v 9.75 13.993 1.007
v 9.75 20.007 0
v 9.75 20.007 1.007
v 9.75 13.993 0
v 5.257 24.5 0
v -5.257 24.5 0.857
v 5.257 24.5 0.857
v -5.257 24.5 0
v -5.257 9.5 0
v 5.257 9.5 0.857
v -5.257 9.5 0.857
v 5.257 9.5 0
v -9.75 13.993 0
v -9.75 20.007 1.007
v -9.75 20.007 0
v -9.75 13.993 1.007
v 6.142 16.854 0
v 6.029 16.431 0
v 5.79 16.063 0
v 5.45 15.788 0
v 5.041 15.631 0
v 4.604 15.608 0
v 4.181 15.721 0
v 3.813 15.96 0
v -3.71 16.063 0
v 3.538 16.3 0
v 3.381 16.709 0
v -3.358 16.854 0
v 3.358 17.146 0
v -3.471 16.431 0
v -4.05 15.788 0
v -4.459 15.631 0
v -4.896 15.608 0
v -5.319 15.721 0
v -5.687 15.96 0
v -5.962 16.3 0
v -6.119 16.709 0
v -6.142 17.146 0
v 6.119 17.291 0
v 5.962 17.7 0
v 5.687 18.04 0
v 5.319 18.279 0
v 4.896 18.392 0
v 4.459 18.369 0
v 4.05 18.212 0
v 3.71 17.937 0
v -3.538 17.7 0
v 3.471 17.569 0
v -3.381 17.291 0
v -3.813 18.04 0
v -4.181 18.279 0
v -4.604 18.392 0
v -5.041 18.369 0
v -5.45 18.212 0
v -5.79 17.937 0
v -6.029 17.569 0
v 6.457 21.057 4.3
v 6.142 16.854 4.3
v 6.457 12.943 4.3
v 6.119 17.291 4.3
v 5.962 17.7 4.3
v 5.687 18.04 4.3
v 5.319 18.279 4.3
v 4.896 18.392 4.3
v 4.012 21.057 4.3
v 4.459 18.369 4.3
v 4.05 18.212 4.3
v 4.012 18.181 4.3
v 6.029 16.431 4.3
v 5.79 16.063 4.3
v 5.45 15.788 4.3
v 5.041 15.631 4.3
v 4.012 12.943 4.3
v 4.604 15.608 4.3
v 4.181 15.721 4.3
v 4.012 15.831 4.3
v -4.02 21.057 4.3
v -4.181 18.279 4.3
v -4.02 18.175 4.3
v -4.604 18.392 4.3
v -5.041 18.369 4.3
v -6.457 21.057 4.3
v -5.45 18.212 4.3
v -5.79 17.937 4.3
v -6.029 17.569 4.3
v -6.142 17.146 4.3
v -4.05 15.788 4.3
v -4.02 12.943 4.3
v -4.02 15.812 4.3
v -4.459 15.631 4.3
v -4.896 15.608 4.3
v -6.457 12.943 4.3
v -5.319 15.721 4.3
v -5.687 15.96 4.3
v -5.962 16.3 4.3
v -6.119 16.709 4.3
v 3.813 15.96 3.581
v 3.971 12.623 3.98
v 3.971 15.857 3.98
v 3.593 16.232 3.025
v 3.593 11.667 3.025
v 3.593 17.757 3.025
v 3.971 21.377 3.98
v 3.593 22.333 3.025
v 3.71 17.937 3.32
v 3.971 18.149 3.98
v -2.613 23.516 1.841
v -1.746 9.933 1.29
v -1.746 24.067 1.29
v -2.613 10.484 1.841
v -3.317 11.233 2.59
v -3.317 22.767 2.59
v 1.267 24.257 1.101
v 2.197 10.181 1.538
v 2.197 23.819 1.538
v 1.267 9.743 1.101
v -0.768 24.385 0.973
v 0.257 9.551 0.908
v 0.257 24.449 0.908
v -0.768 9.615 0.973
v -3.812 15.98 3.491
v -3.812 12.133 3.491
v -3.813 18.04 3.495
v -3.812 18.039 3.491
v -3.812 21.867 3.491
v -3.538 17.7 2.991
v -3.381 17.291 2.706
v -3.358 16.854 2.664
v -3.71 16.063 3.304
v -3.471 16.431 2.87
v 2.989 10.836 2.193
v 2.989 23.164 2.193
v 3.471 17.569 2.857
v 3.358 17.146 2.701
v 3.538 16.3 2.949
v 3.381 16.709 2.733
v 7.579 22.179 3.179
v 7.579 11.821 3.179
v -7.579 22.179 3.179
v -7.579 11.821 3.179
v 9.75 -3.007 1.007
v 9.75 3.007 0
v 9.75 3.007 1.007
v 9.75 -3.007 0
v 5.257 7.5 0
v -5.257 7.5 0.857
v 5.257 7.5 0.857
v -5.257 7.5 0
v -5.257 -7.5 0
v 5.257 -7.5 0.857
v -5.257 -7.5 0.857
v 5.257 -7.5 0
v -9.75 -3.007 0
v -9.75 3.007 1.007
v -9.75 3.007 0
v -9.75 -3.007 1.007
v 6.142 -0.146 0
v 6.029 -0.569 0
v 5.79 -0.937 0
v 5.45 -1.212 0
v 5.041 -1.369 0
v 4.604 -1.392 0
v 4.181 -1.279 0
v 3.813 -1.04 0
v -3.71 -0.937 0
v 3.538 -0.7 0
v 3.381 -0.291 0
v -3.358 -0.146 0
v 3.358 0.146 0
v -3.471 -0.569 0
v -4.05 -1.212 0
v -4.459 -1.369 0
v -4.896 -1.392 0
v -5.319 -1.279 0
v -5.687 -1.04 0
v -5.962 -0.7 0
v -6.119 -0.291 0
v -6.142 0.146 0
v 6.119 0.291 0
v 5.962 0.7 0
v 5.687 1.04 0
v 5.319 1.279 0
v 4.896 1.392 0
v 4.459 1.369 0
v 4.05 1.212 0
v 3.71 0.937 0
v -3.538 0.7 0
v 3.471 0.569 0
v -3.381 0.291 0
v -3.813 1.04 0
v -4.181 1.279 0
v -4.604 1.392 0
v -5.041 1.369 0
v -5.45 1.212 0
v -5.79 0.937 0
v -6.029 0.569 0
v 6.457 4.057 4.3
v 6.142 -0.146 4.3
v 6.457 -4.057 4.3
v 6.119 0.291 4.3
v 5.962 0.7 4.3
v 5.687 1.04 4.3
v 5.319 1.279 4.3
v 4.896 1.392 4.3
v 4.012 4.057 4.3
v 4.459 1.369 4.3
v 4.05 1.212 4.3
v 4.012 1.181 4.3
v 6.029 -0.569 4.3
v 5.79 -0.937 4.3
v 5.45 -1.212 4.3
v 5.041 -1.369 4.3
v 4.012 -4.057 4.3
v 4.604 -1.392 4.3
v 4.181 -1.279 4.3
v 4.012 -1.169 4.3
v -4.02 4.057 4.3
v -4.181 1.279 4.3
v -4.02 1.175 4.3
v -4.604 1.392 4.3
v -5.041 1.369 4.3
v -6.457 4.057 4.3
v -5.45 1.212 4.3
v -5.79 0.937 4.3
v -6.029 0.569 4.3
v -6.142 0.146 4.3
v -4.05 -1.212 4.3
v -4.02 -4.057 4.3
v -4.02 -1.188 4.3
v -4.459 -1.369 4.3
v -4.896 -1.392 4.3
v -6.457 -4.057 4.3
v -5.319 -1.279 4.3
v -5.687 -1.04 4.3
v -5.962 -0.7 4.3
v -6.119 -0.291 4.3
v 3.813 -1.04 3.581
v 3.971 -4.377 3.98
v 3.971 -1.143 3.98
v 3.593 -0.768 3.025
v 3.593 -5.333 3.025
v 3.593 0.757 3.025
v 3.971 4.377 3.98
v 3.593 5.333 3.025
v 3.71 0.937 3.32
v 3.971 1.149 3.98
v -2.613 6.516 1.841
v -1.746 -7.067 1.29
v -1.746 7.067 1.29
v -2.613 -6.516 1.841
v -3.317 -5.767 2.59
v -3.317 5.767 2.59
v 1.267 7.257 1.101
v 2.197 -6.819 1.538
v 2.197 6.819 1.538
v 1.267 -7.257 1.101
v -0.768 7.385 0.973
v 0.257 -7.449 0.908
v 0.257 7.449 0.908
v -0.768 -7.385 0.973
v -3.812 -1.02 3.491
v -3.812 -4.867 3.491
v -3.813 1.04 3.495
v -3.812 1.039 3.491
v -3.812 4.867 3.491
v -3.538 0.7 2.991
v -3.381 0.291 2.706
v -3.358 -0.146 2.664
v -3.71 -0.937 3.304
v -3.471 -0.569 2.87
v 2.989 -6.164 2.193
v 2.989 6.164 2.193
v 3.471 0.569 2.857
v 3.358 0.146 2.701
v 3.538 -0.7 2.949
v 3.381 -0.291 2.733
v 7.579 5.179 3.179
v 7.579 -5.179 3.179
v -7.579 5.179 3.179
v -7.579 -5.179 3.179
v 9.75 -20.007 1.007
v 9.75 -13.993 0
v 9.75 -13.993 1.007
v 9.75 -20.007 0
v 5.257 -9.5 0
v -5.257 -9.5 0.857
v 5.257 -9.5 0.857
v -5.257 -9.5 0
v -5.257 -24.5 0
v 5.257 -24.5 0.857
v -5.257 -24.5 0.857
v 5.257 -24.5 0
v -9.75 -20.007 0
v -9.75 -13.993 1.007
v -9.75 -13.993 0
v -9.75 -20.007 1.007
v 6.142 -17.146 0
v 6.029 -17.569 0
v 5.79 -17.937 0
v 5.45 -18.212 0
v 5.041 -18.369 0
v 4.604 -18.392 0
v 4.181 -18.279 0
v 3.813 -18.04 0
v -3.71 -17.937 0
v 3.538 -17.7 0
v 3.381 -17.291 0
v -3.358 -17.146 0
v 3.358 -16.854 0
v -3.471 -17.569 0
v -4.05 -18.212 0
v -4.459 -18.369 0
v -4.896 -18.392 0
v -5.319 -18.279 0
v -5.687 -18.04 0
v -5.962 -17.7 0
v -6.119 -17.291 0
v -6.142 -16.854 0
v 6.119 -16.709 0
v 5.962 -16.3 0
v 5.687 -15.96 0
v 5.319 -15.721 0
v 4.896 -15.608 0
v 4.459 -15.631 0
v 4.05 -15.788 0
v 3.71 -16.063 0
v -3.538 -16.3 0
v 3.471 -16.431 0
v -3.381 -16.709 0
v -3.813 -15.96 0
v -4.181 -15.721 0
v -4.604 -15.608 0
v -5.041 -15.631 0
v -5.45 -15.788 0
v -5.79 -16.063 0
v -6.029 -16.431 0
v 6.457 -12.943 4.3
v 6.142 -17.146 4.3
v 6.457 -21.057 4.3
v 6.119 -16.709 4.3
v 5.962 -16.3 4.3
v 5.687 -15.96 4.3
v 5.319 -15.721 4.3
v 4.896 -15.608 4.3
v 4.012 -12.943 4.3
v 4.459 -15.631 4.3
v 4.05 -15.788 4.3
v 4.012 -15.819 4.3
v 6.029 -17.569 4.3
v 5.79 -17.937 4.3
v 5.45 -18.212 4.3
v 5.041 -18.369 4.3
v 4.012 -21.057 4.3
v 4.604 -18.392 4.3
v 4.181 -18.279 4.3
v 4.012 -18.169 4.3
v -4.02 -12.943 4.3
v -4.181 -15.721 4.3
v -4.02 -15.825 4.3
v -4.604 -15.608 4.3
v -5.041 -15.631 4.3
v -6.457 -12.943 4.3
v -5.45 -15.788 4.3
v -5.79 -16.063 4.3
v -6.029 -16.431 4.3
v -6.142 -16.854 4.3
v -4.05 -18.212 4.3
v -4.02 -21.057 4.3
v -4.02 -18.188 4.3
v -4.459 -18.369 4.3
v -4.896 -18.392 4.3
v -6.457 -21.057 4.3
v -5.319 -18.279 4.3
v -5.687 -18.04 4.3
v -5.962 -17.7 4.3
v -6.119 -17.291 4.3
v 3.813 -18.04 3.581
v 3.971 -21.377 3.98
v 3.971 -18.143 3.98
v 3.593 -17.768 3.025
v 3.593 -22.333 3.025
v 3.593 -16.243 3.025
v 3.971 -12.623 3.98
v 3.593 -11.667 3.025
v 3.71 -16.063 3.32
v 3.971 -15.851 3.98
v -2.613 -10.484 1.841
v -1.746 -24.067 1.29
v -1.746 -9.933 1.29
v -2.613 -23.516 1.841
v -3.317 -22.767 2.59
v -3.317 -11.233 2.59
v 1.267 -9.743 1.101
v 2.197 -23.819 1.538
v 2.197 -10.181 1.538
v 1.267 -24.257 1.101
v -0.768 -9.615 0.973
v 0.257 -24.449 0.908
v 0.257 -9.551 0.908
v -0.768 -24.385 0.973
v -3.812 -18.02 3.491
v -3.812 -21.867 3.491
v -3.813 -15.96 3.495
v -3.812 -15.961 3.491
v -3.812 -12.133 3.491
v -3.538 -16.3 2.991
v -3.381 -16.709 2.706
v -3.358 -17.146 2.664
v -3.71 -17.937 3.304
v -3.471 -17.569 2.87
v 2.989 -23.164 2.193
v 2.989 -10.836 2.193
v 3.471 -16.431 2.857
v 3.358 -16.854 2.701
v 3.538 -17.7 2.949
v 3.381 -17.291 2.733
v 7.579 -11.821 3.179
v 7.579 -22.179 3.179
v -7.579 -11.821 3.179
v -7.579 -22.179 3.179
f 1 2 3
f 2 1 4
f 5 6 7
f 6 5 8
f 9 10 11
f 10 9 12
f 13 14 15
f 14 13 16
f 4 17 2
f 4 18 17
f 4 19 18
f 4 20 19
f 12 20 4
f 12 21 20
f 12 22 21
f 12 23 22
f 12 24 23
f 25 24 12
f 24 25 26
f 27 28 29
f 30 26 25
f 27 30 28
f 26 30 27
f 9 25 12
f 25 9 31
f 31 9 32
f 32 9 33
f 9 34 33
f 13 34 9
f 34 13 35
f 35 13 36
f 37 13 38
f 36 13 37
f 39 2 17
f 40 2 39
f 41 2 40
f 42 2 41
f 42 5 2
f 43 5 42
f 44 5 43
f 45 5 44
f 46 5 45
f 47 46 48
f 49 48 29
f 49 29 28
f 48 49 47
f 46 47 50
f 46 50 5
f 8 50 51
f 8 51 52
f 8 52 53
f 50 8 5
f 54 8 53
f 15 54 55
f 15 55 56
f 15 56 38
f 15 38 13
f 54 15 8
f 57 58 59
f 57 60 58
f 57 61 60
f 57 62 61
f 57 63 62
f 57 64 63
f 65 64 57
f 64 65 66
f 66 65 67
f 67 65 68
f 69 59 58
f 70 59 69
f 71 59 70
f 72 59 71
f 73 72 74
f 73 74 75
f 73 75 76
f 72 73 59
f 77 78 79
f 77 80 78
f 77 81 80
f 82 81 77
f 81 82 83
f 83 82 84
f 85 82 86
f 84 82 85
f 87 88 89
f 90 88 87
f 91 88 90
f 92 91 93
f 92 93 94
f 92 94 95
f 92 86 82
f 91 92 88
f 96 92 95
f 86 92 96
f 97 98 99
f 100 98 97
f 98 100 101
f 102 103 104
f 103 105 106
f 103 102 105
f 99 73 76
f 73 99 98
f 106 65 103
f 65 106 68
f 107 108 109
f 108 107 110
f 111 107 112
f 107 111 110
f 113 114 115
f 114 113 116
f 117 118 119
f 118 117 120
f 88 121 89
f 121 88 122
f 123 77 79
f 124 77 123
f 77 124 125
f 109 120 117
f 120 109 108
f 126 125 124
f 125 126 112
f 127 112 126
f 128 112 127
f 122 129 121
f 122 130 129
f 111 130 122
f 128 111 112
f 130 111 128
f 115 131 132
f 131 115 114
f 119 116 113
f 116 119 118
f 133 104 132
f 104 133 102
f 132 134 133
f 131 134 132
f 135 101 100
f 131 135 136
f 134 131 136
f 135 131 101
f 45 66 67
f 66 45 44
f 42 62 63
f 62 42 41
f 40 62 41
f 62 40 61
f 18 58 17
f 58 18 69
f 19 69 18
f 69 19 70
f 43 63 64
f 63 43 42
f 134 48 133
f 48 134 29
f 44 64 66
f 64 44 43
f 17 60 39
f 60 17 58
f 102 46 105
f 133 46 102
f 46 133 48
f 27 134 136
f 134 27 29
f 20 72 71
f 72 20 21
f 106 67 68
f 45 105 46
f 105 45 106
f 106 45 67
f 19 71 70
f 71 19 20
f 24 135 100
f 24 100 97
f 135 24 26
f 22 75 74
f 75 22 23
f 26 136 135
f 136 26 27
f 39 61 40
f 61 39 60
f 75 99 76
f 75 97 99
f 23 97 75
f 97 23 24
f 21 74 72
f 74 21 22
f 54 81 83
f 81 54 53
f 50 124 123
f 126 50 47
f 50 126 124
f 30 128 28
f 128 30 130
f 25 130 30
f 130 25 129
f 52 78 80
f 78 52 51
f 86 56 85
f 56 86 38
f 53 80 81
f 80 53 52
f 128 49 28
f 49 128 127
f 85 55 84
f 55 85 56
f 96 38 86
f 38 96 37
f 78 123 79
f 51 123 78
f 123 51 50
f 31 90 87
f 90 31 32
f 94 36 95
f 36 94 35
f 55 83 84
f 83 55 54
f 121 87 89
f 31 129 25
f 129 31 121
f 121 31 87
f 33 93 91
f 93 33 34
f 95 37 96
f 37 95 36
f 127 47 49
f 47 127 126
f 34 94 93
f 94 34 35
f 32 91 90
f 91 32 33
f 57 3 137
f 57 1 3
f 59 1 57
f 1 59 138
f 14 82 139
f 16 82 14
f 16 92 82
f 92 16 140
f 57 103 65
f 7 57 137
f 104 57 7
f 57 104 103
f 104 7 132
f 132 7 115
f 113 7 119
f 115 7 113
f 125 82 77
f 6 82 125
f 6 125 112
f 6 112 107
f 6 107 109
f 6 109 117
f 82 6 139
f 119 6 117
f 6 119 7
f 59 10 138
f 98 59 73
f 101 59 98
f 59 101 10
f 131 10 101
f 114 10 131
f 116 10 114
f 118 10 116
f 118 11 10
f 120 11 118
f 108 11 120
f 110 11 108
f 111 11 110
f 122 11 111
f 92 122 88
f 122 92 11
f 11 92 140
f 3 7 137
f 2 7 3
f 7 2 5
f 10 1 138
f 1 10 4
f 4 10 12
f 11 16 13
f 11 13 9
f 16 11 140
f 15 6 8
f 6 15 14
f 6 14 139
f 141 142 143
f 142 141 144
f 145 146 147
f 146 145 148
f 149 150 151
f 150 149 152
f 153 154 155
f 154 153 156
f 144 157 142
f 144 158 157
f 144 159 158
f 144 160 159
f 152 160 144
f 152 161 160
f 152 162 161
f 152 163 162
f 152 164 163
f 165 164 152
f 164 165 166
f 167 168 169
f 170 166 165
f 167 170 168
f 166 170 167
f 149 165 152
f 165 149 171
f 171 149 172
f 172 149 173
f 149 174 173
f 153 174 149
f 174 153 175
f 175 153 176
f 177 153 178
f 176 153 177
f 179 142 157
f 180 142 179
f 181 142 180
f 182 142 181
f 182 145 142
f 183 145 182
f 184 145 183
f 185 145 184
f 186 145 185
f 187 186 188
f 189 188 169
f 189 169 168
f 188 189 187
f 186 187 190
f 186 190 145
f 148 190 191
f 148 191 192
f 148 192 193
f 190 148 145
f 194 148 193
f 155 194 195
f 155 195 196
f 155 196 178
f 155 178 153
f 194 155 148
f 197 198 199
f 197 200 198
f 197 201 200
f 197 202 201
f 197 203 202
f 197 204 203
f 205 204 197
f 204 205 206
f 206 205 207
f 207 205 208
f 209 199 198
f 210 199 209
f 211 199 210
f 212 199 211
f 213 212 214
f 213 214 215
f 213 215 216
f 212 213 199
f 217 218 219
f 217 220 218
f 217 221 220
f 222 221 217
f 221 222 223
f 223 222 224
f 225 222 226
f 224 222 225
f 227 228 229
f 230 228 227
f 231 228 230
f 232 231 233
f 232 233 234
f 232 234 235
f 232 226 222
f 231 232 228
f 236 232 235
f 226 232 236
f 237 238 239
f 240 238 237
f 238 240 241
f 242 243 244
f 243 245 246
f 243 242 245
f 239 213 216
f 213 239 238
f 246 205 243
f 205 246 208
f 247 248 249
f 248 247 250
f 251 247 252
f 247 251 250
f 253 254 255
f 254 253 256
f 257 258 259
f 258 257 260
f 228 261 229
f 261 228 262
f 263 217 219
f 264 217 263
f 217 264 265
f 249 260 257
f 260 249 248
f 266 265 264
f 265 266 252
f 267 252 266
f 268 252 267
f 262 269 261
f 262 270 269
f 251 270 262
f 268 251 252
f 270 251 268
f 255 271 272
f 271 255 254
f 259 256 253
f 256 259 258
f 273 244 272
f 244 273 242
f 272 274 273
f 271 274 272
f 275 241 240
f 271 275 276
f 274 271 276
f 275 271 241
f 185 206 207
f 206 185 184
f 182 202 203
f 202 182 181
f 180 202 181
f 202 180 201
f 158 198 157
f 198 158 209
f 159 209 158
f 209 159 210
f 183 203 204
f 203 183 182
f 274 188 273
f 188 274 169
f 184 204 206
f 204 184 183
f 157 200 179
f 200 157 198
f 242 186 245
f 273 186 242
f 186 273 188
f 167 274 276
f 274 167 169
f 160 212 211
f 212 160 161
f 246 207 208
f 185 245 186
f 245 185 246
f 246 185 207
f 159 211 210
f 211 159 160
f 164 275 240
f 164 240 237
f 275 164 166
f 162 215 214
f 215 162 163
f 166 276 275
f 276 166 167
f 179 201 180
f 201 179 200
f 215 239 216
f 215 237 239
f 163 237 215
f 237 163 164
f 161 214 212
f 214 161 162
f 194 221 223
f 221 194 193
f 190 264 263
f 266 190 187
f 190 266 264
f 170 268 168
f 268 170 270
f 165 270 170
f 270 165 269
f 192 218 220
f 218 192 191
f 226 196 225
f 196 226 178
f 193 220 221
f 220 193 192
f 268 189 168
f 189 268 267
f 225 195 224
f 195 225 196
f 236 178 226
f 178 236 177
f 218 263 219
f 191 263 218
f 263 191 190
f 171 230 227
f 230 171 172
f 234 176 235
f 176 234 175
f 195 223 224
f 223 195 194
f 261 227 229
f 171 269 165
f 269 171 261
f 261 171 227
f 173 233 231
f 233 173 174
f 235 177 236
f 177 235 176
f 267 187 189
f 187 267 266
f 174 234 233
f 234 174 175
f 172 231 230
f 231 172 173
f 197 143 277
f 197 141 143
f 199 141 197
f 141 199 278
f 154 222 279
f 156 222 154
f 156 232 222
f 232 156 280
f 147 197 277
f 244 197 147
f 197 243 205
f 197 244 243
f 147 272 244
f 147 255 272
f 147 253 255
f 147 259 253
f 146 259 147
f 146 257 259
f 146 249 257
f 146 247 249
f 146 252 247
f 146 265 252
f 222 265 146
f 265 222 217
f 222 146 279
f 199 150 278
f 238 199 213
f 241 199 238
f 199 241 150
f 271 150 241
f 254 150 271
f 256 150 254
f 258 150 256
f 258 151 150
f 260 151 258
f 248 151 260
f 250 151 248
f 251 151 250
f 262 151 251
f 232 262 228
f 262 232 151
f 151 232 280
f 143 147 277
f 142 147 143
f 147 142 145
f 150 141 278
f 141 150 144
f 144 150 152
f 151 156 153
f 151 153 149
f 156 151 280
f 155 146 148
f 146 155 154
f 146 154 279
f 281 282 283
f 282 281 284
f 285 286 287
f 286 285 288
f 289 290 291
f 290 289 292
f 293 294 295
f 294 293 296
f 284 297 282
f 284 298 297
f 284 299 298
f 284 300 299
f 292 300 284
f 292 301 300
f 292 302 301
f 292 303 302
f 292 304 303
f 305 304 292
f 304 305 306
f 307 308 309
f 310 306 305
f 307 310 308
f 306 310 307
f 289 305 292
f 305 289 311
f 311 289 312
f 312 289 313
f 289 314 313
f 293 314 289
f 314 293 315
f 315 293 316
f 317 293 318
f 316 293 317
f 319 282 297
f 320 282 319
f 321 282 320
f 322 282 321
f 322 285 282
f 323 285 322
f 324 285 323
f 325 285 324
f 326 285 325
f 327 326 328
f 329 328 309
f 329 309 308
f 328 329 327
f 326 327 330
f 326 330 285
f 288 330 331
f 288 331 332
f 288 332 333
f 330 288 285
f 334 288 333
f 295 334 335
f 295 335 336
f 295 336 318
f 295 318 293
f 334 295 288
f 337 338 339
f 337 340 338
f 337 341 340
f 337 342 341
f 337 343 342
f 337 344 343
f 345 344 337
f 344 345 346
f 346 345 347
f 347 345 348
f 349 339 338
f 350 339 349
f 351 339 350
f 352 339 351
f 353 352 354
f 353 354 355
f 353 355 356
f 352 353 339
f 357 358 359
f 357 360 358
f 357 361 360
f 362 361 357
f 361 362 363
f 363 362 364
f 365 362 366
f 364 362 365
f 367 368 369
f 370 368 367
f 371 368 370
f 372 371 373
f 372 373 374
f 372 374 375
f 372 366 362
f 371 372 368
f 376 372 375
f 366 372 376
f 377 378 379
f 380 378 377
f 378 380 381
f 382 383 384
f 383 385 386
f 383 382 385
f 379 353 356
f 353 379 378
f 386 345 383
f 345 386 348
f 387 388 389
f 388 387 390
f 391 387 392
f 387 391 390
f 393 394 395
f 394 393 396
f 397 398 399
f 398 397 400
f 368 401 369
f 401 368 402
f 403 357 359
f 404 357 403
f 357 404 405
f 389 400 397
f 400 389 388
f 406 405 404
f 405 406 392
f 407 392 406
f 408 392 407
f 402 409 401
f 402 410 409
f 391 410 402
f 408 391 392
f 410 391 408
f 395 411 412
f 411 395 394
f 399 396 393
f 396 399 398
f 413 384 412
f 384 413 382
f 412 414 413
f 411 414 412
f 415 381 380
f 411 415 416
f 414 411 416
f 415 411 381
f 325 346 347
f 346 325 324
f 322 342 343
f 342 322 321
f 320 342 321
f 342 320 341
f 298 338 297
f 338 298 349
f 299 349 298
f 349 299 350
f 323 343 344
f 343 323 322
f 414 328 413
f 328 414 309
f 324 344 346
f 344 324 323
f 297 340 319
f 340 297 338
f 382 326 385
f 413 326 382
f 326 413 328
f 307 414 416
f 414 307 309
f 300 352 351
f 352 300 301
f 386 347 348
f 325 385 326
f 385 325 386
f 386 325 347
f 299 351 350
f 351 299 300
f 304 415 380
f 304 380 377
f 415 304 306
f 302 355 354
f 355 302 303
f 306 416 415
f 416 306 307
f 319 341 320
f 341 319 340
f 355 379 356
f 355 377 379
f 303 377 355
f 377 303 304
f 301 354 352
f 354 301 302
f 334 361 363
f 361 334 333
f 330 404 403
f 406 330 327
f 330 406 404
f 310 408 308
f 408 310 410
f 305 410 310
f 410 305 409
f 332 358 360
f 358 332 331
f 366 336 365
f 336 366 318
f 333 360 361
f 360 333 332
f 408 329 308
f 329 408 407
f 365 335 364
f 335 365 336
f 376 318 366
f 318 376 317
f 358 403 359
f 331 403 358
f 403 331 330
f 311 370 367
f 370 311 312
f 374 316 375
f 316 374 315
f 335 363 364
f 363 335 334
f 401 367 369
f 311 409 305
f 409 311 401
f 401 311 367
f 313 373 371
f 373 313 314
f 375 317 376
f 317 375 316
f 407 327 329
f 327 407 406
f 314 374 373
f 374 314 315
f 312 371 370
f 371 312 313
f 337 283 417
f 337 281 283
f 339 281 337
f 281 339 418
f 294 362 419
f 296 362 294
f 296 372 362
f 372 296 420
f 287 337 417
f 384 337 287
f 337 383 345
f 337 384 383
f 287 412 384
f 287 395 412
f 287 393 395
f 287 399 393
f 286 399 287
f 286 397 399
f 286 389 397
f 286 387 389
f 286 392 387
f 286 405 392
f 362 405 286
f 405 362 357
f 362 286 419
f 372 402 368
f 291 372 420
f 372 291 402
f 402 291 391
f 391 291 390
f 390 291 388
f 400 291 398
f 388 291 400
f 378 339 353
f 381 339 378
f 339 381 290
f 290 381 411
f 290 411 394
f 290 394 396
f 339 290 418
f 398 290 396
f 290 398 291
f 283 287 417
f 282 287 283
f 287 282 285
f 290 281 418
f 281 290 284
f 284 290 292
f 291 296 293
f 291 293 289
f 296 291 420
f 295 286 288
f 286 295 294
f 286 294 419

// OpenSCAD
print();
//assembled();

module print(){
translate([0,17,0.7+4.3]) rotate([-90,0,0]) holder();
translate([0,0,0.7+4.3]) rotate([-90,0,0]) holder();
translate([0,-17,0.7+4.3]) rotate([-90,0,0]) holder();
}

module assembled(){
//endstop representation
translate([0,3.25+4+1,5.375-3]) %cube(([19.75,6.5,10.75]),center=true);
//smooth rod representation
%cylinder(r=4,h=30,$fn=30,center=true);
holder();
}

module holder(){
difference(){
//body
translate([0,2.15+0.7,0]) cube(([19.5,4.3,15]),center=true);
//smooth rod
translate([0,0,-1]) cylinder(r=4.1,h=20,$fn=25,center=true);
//fixing holes
translate([4.75,10,0]) rotate([90,0,0]) rotate([0,0,30])  cylinder(r=1.4,h=20,$fn=20);
translate([-4.75,10,0]) rotate([90,0,0]) rotate([0,0,30])  cylinder(r=1.4,h=20,$fn=20);
//fancy edges
translate([10,0,0]) rotate([0,0,45]) cube(([10,6,20]),center=true);
translate([-10,0,0]) rotate([0,0,-45]) cube(([10,6,20]),center=true);
translate([0,0,7.6]) rotate([45,0,0]) cube(([20,10,6]),center=true);
translate([0,0,-7.6]) rotate([-45,0,0]) cube(([20,10,6]),center=true);
translate([8.5,0,8.5]) rotate([0,45,0]) cube(([20,20,6]),center=true);
translate([8.5,0,-8.5]) rotate([0,-45,0]) cube(([20,20,6]),center=true);
translate([-8.5,0,-8.5]) rotate([0,45,0]) cube(([20,20,6]),center=true);
translate([-8.5,0,8.5]) rotate([0,-45,0]) cube(([20,20,6]),center=true);
}
}
